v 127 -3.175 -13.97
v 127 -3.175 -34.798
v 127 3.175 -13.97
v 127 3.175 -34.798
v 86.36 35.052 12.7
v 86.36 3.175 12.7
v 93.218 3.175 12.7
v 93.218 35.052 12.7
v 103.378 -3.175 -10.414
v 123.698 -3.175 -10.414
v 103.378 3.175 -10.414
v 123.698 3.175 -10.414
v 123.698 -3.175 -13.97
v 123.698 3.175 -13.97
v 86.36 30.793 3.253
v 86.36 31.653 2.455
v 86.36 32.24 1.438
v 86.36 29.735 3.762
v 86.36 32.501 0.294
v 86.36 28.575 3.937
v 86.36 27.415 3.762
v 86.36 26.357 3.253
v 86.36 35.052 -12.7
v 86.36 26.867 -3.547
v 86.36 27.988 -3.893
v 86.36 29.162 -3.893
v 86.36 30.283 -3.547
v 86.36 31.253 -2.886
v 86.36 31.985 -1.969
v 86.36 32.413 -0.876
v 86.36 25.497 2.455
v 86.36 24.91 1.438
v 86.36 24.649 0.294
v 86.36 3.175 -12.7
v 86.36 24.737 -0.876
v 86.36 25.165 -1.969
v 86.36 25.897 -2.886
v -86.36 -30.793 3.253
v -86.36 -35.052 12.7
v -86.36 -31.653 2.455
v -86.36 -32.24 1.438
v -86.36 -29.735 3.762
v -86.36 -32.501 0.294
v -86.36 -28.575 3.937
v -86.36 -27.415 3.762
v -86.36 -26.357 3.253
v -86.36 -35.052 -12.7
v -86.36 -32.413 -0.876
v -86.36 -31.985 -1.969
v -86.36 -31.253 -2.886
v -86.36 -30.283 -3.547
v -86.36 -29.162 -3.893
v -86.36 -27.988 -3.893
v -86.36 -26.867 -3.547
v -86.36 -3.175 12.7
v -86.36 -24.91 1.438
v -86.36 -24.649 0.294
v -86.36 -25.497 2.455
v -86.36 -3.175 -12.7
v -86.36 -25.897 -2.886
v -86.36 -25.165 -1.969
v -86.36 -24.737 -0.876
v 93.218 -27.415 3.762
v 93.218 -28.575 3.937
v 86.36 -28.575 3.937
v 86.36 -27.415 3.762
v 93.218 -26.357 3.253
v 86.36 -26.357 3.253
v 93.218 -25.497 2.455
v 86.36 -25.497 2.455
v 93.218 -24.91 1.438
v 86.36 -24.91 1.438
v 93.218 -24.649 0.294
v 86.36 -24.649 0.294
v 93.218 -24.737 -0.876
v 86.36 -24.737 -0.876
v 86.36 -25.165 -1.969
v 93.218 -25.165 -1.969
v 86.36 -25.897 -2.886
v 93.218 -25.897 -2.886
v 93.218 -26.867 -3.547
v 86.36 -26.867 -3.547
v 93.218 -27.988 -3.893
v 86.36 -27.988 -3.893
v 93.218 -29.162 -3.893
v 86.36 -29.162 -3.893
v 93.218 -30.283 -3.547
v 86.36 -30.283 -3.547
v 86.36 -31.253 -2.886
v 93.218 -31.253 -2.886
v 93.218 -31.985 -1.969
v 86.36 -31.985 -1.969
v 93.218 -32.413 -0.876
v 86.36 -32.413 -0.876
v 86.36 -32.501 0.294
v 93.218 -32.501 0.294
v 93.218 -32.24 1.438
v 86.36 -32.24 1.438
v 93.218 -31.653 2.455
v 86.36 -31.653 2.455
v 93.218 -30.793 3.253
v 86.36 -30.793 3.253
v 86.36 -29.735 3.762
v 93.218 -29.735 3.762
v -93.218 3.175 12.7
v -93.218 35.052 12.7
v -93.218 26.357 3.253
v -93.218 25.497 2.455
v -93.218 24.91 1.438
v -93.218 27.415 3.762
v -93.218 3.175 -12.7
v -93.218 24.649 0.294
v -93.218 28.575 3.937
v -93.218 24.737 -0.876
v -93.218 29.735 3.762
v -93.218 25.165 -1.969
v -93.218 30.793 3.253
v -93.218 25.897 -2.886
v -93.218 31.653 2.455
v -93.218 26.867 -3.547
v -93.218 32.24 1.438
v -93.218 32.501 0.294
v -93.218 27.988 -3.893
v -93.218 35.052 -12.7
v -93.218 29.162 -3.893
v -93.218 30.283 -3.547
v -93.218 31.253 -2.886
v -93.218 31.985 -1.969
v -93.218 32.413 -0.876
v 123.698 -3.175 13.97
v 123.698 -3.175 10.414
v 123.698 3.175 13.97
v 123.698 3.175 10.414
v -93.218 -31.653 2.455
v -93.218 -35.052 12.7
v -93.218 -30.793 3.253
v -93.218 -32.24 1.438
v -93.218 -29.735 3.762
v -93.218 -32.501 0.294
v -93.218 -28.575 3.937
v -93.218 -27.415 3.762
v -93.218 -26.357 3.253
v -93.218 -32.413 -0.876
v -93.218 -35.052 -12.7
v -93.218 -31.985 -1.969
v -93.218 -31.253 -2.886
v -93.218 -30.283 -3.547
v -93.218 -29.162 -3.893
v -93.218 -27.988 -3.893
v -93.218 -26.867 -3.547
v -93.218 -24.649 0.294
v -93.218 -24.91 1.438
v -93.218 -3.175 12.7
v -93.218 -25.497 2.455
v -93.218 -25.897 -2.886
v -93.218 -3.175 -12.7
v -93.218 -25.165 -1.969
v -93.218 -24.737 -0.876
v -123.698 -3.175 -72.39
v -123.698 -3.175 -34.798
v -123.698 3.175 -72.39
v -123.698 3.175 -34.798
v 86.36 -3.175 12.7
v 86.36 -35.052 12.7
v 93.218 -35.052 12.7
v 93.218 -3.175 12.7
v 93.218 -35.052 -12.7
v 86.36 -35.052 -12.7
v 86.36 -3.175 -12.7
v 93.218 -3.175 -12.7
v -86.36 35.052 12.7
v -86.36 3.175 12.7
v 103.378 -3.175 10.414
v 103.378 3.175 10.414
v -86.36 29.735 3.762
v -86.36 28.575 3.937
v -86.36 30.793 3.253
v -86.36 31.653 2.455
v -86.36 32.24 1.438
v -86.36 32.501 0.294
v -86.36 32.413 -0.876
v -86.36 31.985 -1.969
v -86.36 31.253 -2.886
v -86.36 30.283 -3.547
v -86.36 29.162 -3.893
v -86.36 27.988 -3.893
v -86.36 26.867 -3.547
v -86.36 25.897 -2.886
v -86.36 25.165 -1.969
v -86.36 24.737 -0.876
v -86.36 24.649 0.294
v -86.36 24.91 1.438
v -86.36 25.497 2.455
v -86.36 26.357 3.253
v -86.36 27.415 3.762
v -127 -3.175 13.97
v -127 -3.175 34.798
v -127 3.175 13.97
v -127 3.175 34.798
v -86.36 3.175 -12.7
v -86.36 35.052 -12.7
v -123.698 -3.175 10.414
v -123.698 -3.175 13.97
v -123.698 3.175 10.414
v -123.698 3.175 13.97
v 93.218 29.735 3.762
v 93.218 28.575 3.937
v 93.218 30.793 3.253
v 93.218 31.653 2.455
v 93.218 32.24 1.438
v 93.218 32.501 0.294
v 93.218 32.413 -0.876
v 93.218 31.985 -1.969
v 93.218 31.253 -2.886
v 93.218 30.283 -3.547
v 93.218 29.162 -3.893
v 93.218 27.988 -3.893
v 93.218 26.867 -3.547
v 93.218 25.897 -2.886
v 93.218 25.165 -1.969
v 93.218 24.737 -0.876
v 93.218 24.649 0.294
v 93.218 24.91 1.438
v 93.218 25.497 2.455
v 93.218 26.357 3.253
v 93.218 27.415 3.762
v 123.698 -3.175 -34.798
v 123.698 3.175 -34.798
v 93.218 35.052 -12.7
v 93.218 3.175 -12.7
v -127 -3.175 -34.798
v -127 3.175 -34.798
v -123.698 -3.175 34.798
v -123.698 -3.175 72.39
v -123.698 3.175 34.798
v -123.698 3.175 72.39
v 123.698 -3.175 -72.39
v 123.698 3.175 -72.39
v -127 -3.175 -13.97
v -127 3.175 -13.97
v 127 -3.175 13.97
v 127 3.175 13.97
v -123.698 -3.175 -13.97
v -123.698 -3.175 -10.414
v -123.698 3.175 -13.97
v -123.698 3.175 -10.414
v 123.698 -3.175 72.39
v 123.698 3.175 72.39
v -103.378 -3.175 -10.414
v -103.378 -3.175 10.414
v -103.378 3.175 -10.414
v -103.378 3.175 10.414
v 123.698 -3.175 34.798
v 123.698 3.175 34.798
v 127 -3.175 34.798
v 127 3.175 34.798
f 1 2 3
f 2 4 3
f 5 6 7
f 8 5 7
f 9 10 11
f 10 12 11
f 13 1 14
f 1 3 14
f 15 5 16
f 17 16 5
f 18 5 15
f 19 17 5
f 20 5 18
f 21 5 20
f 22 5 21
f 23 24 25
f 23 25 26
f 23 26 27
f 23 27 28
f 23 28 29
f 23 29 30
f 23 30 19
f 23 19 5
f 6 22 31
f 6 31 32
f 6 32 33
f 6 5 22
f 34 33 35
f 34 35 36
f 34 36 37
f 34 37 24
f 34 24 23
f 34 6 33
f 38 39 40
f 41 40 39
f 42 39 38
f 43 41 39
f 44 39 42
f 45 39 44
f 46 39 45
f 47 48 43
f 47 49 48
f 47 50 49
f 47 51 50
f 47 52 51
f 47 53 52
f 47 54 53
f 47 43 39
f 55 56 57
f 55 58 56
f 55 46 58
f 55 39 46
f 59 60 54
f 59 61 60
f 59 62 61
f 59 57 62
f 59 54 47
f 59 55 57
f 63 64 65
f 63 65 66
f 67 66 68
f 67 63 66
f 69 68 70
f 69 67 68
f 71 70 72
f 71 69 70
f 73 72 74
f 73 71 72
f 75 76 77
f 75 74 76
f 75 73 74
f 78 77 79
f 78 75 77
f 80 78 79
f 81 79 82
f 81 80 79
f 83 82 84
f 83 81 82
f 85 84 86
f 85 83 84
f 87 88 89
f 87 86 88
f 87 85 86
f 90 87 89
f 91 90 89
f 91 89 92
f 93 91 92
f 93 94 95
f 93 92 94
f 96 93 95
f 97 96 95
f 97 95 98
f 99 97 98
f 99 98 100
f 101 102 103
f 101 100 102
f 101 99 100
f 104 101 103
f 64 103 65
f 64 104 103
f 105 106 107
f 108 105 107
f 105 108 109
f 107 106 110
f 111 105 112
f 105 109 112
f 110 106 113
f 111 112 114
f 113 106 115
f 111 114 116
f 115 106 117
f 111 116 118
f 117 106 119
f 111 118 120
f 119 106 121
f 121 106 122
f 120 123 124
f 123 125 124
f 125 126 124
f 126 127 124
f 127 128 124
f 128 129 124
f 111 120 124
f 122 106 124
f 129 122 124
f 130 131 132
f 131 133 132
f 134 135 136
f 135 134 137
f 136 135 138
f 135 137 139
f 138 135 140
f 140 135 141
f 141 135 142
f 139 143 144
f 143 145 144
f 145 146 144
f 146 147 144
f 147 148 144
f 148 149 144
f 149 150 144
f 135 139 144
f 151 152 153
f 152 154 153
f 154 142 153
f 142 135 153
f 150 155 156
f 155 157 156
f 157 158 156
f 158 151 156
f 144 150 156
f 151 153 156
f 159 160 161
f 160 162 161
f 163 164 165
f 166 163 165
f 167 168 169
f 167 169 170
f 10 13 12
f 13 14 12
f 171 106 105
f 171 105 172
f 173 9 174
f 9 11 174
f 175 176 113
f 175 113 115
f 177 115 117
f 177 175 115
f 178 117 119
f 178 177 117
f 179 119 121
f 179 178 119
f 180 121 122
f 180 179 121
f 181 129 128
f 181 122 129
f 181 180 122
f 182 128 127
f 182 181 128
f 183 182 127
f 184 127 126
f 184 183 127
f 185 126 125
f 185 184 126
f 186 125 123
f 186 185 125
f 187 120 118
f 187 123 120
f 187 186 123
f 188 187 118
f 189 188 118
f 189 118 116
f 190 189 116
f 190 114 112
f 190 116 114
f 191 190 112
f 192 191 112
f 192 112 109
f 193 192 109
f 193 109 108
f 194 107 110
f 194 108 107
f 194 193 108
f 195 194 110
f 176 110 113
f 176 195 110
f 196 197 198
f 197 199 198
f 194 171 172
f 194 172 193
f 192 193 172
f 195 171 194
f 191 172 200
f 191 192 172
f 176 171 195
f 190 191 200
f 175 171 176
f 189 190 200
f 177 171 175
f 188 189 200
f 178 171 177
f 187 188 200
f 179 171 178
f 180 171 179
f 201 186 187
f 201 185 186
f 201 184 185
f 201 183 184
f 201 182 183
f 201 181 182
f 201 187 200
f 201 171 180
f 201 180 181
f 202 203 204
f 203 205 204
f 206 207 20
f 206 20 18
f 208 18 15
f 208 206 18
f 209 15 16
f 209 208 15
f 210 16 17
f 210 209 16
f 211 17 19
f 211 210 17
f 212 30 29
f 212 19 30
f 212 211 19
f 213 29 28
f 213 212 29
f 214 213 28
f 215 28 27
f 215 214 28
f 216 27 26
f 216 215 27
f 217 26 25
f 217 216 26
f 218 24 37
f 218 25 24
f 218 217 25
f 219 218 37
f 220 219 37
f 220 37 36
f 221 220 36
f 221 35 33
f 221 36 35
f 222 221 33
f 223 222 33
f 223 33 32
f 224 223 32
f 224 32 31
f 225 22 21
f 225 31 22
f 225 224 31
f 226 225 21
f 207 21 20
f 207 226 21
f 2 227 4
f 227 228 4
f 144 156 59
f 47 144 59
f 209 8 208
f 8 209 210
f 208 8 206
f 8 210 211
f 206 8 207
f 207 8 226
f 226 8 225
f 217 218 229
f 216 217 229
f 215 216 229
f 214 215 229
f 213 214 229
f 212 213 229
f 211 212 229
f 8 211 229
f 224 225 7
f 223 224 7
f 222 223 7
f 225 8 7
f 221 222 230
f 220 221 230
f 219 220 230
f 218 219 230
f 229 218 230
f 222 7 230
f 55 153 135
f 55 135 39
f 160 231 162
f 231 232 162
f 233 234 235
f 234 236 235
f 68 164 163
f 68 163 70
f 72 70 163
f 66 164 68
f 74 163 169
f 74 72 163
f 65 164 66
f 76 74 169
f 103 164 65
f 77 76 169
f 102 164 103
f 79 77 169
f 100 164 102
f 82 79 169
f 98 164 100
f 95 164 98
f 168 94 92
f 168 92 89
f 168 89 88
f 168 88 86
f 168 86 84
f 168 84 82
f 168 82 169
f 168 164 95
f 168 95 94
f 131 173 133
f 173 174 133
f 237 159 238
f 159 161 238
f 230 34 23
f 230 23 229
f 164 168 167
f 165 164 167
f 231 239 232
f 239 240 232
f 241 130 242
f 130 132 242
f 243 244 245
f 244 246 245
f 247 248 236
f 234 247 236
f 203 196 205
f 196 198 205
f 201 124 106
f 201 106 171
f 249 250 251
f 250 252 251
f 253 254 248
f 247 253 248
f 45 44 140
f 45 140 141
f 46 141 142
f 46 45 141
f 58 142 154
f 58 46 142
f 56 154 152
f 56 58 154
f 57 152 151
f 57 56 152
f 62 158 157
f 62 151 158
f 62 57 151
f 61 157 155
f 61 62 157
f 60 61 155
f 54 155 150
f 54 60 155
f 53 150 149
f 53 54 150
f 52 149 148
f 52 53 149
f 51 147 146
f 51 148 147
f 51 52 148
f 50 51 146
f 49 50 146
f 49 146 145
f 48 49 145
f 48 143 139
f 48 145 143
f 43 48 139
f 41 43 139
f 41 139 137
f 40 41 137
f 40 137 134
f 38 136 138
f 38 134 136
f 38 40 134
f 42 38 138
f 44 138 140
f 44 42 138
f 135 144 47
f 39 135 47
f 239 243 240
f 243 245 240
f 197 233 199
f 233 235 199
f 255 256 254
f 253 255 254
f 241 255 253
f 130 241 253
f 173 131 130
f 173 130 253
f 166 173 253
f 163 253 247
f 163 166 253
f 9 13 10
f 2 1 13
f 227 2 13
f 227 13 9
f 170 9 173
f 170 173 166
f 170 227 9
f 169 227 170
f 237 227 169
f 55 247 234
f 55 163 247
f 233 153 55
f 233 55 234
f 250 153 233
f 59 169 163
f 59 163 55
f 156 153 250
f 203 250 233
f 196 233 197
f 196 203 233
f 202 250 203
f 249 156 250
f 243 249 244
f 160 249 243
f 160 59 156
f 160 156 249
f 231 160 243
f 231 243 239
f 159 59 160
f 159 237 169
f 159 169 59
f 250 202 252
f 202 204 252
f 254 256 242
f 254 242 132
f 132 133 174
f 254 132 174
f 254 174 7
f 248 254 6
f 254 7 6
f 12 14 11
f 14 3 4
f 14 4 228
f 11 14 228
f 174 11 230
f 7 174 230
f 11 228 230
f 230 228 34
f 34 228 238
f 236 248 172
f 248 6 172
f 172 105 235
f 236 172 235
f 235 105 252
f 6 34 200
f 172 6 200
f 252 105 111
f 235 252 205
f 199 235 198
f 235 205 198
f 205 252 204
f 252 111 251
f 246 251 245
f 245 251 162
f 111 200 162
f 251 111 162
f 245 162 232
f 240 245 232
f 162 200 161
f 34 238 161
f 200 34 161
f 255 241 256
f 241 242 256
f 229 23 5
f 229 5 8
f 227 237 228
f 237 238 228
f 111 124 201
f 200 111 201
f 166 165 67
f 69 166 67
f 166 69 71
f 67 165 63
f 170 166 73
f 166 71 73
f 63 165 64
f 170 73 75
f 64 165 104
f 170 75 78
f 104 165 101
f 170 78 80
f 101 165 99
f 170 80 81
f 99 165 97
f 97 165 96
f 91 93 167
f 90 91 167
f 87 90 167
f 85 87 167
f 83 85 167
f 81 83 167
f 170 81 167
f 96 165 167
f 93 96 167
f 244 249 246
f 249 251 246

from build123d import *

# Parameters (mm, degrees)
BOSS_EXTRUDE1_DEPTH     = 3.175
SKETCH2_W               = 6.858
SKETCH2_H               = 25.4
BOSS_EXTRUDE2_DEPTH     = 35.052
CUT_EXTRUDE1_DEPTH      = 235.445990215
CUT_EXTRUDE1_DEPTH_BACK = 235.445990215
SKETCH3_R               = 3.937


with BuildPart() as part:
    # Sketch1 → Boss-Extrude1 (new, symmetric)
    with BuildSketch(Plane(origin=(0, 0, 0), x_dir=(1, 0, 0), z_dir=(0, 1, 0))):
        Polygon((123.698, -72.39), (-123.698, -72.39), (-123.698, -34.798), (-127, -34.798), (-127, -13.97), (-123.698, -13.97), (-123.698, -10.414), (-103.378, -10.414), (-103.378, 10.414), (-123.698, 10.414), (-123.698, 13.97), (-127, 13.97), (-127, 34.798), (-123.698, 34.798), (-123.698, 72.39), (123.698, 72.39), (123.698, 34.798), (127, 34.798), (127, 13.97), (123.698, 13.97), (123.698, 10.414), (103.378, 10.414), (103.378, -10.414), (123.698, -10.414), (123.698, -13.97), (127, -13.97), (127, -34.798), (123.698, -34.798), align=None)
    extrude(amount=BOSS_EXTRUDE1_DEPTH, both=True)

    # Sketch2 → Boss-Extrude2 (add, symmetric)
    with BuildSketch(Plane(origin=(0, 0, 0), x_dir=(1, 0, 0), z_dir=(0, 1, 0))):
        with Locations((89.789, 0)):
            Rectangle(SKETCH2_W, SKETCH2_H)
        with Locations((-89.789, 0)):
            Rectangle(SKETCH2_W, SKETCH2_H)
    extrude(amount=BOSS_EXTRUDE2_DEPTH, both=True)

    # Sketch3 → Cut-Extrude1 (cut, two sides: drawn at the far end of the back side and taken through both)
    with BuildSketch(Plane.ZY.offset(93.218).offset(-CUT_EXTRUDE1_DEPTH_BACK)):
        with Locations((0, 28.575)):
            Circle(SKETCH3_R)
        with Locations((0, -28.575)):
            Circle(SKETCH3_R)
    extrude(amount=CUT_EXTRUDE1_DEPTH + CUT_EXTRUDE1_DEPTH_BACK, mode=Mode.SUBTRACT)


solid = part.part
